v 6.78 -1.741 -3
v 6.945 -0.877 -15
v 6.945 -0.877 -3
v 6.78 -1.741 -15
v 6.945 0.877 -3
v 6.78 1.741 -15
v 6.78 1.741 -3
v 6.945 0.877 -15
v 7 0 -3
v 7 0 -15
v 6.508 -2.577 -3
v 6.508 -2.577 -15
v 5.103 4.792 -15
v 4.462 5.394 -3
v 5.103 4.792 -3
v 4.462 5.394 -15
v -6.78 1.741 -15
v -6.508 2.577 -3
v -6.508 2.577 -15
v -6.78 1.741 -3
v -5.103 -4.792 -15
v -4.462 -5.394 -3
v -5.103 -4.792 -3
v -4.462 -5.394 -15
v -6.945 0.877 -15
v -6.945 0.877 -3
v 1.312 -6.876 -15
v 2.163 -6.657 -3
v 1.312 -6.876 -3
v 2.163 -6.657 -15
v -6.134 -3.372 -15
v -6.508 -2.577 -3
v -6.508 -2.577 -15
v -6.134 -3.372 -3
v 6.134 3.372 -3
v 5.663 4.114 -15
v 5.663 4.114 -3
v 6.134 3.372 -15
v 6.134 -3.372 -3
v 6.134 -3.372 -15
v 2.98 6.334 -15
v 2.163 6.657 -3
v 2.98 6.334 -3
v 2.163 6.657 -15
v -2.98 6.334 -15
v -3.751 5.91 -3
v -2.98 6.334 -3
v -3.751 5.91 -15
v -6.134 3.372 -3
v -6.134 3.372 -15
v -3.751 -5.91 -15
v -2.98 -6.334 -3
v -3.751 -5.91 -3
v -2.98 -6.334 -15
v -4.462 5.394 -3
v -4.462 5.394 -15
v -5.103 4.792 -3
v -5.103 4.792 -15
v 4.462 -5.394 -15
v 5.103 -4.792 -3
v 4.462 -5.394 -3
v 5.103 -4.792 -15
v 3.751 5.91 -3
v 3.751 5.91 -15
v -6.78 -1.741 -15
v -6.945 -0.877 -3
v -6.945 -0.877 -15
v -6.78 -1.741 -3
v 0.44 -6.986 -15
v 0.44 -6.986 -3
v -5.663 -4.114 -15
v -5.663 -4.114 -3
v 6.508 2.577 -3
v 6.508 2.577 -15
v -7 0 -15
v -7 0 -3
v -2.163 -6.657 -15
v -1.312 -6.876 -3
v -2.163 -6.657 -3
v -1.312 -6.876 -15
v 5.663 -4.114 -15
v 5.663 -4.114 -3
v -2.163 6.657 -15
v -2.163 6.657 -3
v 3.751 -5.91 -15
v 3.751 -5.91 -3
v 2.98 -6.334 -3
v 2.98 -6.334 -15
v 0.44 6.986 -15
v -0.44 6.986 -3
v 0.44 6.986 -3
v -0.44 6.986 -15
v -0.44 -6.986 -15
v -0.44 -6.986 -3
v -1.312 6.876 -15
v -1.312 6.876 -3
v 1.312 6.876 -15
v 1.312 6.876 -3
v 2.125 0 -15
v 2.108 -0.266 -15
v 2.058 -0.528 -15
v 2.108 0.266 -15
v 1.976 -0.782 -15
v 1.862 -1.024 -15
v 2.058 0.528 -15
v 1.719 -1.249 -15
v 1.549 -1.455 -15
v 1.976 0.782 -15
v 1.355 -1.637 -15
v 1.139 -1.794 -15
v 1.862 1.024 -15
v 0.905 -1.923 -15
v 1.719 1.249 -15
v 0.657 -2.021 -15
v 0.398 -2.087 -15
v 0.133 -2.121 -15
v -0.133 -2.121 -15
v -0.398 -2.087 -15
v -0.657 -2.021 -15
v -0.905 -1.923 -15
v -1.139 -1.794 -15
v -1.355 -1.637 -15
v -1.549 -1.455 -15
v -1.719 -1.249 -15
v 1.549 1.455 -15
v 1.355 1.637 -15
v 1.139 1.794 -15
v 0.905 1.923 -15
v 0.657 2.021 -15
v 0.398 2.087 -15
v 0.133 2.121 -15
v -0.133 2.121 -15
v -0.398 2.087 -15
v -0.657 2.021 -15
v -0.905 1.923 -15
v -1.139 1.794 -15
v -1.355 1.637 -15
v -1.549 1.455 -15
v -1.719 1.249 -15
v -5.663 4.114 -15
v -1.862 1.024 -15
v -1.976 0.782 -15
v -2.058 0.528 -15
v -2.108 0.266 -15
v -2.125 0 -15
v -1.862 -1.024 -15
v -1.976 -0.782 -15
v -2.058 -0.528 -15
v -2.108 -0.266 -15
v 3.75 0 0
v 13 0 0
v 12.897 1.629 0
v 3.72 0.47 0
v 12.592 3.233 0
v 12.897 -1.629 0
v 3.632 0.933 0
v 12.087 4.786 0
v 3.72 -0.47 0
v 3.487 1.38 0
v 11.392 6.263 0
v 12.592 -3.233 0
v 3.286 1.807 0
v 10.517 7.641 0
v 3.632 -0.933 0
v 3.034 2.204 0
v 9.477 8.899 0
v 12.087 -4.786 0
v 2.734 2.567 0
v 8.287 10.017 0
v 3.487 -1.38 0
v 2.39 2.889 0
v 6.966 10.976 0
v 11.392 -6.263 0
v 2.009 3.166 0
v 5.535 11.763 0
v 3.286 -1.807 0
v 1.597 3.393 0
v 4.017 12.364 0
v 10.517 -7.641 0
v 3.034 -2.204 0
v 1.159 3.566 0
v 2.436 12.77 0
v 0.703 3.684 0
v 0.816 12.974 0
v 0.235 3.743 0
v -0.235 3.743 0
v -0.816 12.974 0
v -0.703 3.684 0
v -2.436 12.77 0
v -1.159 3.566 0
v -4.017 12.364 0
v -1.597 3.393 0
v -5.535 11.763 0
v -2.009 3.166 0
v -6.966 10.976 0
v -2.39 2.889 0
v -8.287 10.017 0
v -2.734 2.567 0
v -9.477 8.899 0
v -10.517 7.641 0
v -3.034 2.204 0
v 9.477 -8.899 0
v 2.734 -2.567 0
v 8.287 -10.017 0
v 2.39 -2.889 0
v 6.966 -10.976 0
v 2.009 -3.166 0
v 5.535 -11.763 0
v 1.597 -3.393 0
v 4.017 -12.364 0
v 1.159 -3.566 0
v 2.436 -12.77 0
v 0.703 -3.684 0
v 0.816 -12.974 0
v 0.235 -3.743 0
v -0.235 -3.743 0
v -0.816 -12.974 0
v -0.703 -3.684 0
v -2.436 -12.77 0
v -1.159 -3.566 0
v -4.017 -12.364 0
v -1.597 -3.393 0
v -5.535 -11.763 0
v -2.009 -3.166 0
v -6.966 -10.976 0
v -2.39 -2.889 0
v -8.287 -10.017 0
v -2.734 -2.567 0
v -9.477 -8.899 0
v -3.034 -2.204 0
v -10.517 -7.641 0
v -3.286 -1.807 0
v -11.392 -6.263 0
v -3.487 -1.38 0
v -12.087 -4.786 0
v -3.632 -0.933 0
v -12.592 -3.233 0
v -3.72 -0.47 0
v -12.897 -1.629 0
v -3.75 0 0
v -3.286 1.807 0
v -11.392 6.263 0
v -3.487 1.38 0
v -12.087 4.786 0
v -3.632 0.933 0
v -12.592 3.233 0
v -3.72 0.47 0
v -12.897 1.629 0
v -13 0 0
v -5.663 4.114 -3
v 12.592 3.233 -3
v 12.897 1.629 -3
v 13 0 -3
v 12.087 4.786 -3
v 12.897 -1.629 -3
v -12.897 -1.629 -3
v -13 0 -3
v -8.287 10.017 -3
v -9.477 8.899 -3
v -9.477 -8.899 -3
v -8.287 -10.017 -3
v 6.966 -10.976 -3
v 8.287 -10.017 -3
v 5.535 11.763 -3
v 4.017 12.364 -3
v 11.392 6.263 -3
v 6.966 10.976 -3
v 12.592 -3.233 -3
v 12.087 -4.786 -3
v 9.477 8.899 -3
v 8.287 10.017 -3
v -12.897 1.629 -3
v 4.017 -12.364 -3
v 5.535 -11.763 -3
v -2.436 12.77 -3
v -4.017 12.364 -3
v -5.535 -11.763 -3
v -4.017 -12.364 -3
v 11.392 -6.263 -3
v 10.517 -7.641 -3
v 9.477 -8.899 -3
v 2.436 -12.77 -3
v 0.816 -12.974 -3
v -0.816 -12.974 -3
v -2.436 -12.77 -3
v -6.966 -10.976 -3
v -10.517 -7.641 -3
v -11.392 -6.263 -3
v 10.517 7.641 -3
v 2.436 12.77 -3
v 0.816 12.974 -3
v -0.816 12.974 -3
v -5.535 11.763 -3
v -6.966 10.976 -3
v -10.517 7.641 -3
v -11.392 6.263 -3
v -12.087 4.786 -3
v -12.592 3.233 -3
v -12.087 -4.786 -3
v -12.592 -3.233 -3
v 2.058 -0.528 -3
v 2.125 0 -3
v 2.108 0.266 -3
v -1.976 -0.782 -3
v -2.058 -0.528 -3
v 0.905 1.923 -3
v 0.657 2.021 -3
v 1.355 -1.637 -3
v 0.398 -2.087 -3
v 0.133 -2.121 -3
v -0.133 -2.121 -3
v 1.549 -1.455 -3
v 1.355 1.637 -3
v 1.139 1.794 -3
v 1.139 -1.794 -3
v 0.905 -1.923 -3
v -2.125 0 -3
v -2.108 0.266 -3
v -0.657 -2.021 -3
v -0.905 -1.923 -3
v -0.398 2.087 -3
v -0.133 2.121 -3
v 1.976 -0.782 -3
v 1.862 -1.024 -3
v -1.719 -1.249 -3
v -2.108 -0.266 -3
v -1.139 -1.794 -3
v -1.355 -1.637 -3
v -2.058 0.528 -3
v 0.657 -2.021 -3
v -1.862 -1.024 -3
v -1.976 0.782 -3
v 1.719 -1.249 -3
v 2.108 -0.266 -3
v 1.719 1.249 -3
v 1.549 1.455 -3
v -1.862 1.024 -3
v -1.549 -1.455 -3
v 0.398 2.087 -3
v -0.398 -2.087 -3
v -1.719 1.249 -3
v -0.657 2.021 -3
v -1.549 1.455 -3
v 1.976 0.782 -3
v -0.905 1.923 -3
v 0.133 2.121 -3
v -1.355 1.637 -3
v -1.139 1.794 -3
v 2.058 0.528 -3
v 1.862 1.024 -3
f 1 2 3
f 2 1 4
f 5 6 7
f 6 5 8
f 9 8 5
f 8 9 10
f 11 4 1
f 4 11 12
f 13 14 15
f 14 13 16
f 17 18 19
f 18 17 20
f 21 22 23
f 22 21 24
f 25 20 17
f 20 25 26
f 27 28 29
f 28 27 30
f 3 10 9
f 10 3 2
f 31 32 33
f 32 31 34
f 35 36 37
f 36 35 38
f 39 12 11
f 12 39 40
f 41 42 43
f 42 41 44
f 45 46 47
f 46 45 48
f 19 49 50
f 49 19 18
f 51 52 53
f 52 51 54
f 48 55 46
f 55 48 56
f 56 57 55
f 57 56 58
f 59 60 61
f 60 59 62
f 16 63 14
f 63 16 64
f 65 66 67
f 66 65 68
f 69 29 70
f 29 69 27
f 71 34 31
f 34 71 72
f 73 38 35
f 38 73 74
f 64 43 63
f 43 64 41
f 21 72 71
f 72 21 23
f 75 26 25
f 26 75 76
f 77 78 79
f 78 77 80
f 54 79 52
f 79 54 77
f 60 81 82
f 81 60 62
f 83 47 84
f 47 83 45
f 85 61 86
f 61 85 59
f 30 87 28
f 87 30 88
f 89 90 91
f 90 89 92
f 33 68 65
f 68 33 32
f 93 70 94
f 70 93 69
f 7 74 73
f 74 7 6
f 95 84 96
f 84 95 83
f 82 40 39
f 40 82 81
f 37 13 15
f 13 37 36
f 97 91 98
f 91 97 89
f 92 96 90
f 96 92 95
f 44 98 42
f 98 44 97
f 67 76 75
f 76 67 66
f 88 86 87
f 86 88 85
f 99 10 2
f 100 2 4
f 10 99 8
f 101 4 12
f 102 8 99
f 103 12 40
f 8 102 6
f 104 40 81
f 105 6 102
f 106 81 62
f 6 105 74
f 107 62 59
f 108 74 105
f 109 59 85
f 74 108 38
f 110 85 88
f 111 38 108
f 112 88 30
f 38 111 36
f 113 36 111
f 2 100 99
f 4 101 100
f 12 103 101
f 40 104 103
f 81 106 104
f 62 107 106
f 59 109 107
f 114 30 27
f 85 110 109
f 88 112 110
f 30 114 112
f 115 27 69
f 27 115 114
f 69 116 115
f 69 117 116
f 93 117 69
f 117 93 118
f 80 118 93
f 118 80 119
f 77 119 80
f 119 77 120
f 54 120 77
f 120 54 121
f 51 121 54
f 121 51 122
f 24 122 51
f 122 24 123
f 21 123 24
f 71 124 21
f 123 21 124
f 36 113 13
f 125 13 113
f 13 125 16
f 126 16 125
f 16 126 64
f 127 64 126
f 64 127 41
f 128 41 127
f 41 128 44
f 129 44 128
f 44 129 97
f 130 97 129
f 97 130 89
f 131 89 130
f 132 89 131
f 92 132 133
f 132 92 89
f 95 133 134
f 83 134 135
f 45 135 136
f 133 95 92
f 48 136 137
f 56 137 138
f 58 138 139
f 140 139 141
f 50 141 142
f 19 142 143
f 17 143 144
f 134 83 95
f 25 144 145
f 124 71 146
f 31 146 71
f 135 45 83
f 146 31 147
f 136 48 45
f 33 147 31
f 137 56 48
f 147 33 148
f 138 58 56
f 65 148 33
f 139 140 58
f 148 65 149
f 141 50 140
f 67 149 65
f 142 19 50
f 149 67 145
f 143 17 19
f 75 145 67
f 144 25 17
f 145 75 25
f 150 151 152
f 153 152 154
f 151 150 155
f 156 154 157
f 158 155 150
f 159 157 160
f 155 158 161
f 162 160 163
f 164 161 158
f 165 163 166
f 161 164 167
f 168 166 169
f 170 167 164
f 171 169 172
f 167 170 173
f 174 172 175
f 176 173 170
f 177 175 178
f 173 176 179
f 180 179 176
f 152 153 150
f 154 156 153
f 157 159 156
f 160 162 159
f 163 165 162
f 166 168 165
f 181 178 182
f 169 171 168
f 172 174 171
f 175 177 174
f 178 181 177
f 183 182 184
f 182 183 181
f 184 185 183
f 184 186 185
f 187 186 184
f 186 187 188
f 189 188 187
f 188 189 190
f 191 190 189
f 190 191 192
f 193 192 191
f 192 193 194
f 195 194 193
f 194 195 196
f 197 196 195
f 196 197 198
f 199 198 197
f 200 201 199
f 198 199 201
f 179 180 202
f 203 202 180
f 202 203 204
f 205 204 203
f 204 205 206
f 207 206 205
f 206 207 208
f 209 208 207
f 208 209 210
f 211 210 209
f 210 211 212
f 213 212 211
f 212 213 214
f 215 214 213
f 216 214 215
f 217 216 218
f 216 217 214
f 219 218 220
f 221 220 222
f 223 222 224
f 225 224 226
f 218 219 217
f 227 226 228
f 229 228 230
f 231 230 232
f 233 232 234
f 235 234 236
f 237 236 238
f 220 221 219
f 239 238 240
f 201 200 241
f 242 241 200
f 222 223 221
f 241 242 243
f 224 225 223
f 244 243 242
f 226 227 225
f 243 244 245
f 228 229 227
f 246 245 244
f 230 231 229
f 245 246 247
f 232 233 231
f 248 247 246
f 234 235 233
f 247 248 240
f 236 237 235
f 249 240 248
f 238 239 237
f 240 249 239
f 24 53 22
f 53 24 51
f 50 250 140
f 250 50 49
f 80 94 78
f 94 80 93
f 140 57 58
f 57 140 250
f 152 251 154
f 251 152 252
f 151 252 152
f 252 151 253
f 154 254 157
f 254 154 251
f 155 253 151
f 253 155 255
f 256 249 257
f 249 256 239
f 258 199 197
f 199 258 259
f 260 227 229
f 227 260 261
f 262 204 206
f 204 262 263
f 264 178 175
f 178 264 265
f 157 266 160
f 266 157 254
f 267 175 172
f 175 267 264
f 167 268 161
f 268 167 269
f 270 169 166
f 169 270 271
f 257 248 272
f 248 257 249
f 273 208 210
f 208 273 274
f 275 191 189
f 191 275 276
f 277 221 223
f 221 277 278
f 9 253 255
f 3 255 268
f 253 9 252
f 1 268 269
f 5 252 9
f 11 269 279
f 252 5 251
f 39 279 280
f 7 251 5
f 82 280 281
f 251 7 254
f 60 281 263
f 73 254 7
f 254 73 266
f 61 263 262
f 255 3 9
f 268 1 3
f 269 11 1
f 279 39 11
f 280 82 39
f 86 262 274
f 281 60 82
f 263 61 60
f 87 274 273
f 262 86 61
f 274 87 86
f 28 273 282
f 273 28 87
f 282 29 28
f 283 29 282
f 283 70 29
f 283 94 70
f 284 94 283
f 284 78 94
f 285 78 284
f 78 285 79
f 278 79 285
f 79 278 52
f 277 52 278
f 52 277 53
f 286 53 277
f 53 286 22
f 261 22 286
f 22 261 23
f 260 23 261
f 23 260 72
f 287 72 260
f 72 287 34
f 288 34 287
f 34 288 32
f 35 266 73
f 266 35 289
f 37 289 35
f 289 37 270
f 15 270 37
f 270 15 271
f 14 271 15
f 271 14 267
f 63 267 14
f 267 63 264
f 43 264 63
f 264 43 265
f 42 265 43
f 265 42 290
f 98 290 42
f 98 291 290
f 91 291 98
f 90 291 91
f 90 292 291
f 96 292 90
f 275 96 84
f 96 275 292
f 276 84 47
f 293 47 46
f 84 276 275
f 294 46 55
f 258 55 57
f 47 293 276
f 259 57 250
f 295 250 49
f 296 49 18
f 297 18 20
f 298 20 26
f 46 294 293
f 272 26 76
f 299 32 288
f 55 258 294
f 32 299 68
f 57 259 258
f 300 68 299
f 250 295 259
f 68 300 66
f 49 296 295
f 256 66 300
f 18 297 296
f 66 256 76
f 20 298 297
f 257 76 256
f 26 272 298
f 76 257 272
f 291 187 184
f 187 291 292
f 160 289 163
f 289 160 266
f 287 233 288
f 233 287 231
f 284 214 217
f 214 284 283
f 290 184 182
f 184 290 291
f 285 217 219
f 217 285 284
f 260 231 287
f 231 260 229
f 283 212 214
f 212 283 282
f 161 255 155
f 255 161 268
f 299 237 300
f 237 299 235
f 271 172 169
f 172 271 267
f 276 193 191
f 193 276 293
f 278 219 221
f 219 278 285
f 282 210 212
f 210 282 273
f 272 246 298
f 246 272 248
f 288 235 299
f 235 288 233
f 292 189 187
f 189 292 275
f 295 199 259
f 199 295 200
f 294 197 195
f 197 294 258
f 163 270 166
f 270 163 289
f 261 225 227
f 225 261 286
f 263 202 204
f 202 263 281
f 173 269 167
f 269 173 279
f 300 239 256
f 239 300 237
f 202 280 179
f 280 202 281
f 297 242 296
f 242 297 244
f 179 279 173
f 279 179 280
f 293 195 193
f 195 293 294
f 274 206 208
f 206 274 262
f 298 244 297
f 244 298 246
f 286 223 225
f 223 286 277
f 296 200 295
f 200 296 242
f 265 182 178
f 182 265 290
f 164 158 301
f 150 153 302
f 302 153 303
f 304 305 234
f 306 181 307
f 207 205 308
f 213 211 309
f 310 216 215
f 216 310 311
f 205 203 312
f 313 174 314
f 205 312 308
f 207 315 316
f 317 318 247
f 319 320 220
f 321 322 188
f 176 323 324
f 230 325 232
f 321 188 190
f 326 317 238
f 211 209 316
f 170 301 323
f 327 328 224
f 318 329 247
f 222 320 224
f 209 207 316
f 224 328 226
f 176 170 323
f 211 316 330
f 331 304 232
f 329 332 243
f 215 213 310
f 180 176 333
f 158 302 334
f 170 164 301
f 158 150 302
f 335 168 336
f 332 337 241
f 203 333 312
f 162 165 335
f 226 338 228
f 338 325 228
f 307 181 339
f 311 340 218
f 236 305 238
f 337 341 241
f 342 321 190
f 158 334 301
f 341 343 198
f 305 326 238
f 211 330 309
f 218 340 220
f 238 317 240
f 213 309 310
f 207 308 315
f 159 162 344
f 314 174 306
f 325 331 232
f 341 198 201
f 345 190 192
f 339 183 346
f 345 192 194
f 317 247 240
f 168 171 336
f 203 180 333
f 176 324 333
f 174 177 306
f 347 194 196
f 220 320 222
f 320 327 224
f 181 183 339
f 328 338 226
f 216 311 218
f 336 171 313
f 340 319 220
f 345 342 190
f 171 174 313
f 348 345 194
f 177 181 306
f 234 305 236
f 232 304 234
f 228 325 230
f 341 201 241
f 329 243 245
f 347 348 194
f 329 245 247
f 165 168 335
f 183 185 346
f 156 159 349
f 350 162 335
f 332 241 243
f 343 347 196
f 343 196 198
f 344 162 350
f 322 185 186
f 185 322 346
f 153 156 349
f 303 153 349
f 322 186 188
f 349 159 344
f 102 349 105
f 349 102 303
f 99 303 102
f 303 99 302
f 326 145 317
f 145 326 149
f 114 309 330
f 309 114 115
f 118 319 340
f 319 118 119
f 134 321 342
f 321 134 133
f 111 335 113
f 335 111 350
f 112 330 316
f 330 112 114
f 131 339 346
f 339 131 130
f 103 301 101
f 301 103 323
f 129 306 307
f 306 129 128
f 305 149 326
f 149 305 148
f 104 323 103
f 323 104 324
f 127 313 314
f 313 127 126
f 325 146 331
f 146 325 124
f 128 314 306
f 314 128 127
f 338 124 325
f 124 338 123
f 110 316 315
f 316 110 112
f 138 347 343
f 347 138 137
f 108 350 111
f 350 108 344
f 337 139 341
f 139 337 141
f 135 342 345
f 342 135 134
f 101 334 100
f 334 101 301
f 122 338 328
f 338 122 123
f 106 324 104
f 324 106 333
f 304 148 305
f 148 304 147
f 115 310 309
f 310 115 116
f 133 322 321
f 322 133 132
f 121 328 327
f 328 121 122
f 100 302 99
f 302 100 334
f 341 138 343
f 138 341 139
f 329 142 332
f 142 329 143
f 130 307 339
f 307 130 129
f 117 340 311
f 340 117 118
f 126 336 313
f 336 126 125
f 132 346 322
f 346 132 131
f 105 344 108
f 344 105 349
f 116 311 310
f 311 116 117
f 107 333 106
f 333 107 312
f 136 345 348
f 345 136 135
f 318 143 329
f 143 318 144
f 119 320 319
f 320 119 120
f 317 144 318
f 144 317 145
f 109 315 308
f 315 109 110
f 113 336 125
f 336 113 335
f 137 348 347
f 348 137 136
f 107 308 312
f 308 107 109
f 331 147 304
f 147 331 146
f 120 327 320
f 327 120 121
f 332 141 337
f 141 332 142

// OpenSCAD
$fn = 50;


difference() {
	union() {
		translate(v = [0, 0, -15.0000000000]) {
			cylinder(h = 15, r = 7.0000000000);
		}
		translate(v = [0, 0, -3.0000000000]) {
			cylinder(h = 3, r = 13.0000000000);
		}
	}
	union() {
		translate(v = [0, 0, 0]) {
			rotate(a = [0, 0, 0]) {
				difference() {
					union() {
						#translate(v = [0, 0, -15.0000000000]) {
							cylinder(h = 15, r = 2.0000000000);
						}
						#translate(v = [0, 0, -3]) {
							cylinder(h = 3, r = 7.0000000000, r1 = 2.1250000000, r2 = 3.7500000000);
						}
						#translate(v = [0, 0, -15.0000000000]) {
							cylinder(h = 15, r = 2.1250000000);
						}
						#translate(v = [0, 0, -15.0000000000]) {
							cylinder(h = 15, r = 2.0000000000);
						}
					}
					union();
				}
			}
		}
	}
}
